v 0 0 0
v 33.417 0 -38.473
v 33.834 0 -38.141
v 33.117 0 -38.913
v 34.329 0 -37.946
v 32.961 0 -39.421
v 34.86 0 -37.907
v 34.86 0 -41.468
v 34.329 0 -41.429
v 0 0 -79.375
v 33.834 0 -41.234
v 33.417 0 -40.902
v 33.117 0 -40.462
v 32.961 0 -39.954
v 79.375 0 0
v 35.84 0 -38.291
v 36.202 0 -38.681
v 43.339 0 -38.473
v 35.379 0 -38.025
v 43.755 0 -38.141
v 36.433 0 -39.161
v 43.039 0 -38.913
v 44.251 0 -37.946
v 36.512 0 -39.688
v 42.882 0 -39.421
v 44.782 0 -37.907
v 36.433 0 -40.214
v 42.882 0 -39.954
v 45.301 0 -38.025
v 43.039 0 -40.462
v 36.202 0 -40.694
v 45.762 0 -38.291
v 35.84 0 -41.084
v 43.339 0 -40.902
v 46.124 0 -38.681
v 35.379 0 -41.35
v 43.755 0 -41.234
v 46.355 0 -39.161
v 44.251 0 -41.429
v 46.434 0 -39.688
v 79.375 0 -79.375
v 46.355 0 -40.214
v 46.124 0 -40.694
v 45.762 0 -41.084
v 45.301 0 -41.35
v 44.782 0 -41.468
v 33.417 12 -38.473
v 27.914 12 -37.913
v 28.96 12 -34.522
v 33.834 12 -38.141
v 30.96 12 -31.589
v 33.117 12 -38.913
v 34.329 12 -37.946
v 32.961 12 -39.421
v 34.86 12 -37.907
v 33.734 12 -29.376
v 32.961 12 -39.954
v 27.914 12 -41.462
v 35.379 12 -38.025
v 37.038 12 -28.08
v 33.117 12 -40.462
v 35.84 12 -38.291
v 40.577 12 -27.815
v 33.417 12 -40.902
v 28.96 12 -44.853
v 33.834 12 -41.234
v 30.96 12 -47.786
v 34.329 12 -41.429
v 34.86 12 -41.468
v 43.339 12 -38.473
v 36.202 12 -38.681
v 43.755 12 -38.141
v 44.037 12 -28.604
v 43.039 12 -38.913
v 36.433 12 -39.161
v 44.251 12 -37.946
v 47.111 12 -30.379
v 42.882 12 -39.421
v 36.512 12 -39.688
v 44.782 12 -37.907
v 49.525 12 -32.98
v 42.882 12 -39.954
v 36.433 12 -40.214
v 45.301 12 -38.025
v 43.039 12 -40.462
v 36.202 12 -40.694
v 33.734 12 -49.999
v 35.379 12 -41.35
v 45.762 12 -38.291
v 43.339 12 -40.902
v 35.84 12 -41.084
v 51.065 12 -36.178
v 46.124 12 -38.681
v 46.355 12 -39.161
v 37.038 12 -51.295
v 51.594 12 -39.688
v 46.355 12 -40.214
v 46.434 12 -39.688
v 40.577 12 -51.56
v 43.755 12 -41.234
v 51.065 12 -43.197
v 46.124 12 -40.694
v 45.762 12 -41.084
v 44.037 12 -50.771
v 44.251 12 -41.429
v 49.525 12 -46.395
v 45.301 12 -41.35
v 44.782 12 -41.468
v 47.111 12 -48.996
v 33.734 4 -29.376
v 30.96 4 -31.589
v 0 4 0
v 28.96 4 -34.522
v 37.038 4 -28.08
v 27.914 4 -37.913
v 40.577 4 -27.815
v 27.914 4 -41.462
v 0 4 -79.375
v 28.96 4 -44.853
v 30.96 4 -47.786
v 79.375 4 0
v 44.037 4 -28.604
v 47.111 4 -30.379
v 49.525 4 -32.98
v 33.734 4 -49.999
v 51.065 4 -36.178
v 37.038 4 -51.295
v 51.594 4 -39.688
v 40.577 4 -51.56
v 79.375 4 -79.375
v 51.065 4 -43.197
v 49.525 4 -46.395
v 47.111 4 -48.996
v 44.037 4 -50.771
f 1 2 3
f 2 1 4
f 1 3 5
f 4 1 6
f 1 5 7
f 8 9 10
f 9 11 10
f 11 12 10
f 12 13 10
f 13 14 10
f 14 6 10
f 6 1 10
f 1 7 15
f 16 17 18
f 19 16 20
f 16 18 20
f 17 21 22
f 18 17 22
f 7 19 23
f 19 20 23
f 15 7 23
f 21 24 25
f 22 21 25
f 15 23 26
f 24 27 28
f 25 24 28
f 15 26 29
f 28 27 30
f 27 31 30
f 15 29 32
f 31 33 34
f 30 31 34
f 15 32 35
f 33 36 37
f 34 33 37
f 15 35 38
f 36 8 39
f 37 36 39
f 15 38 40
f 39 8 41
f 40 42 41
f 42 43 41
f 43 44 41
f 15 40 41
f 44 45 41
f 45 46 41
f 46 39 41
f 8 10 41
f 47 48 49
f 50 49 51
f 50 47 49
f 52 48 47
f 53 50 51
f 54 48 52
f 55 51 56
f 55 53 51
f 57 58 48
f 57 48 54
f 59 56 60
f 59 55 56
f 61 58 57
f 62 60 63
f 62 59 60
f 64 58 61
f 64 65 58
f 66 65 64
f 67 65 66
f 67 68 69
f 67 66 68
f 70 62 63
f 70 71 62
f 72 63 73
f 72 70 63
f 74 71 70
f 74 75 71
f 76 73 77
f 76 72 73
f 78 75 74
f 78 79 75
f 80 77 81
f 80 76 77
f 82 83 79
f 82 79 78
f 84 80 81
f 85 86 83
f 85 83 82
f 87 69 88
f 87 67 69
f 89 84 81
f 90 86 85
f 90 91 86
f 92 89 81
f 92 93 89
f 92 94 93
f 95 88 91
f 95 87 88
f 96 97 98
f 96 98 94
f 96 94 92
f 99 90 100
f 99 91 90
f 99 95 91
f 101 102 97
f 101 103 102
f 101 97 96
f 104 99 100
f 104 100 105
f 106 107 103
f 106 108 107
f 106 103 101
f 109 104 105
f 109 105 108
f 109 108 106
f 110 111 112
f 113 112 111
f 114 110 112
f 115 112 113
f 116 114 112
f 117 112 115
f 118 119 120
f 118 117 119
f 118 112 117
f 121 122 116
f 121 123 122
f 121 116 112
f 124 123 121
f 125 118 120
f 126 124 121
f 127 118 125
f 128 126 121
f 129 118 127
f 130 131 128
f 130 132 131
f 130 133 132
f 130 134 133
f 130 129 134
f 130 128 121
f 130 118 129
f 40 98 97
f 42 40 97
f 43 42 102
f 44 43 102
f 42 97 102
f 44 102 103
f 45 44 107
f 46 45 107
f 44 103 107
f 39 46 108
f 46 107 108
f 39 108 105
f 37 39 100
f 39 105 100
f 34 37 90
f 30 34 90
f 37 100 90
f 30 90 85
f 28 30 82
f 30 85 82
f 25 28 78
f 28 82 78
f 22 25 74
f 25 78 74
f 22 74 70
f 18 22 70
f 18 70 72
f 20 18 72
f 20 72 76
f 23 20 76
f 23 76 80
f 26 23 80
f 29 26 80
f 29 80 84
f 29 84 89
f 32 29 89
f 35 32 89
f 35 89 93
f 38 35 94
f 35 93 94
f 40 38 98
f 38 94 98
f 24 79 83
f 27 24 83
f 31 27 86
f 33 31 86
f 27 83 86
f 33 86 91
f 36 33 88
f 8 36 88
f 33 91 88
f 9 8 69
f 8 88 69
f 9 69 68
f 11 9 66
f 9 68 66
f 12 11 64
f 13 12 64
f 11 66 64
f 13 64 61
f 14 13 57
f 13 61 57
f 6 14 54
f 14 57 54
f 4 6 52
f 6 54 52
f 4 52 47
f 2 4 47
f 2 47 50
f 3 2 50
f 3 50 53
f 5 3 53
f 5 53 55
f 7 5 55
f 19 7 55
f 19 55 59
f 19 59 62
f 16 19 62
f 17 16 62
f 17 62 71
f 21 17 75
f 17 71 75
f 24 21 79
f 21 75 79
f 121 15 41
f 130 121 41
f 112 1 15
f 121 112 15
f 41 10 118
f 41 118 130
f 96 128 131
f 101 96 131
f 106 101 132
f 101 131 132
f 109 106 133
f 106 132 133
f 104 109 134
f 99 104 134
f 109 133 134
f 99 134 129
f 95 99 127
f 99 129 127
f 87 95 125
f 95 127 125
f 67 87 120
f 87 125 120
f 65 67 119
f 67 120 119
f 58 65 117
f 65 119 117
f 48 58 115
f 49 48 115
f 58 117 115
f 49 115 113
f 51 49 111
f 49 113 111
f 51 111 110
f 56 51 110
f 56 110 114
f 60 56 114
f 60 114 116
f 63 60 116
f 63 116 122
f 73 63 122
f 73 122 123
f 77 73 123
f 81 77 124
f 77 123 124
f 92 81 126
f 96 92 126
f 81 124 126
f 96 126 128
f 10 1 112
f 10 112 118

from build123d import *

# Parameters (mm, degrees)
SKETCH1_W           = 79.375
SKETCH1_H           = 79.375
BOSS_EXTRUDE1_DEPTH = 4
SKETCH2_R           = 11.90625
BOSS_EXTRUDE2_DEPTH = 8
SKETCH3_R           = 1.7859375
CUT_EXTRUDE1_DEPTH  = 12


with BuildPart() as part:
    # Sketch1 → Boss-Extrude1 (new body)
    with BuildSketch(Plane(origin=(0, 0, 0), x_dir=(1, 0, 0), z_dir=(0, 1, 0))):
        with Locations((39.6875, 39.6875)):
            Rectangle(SKETCH1_W, SKETCH1_H)
    extrude(amount=BOSS_EXTRUDE1_DEPTH)

    # Sketch2 → Boss-Extrude2 (add)
    with BuildSketch(Plane(origin=(0, 4, 0), x_dir=(1, 0, 0), z_dir=(0, 1, 0))):
        with Locations((39.6875, 39.6875)):
            Circle(SKETCH2_R)
    extrude(amount=BOSS_EXTRUDE2_DEPTH)

    # Sketch3 → Cut-Extrude1 (cut)
    with BuildSketch(Plane(origin=(0, 12, 0), x_dir=(1, 0, 0), z_dir=(0, 1, 0))):
        with Locations((34.7265625, 39.6875)):
            Circle(SKETCH3_R)
        with Locations((44.6484375, 39.6875)):
            Circle(SKETCH3_R)
    extrude(amount=-CUT_EXTRUDE1_DEPTH, mode=Mode.SUBTRACT)


solid = part.part
